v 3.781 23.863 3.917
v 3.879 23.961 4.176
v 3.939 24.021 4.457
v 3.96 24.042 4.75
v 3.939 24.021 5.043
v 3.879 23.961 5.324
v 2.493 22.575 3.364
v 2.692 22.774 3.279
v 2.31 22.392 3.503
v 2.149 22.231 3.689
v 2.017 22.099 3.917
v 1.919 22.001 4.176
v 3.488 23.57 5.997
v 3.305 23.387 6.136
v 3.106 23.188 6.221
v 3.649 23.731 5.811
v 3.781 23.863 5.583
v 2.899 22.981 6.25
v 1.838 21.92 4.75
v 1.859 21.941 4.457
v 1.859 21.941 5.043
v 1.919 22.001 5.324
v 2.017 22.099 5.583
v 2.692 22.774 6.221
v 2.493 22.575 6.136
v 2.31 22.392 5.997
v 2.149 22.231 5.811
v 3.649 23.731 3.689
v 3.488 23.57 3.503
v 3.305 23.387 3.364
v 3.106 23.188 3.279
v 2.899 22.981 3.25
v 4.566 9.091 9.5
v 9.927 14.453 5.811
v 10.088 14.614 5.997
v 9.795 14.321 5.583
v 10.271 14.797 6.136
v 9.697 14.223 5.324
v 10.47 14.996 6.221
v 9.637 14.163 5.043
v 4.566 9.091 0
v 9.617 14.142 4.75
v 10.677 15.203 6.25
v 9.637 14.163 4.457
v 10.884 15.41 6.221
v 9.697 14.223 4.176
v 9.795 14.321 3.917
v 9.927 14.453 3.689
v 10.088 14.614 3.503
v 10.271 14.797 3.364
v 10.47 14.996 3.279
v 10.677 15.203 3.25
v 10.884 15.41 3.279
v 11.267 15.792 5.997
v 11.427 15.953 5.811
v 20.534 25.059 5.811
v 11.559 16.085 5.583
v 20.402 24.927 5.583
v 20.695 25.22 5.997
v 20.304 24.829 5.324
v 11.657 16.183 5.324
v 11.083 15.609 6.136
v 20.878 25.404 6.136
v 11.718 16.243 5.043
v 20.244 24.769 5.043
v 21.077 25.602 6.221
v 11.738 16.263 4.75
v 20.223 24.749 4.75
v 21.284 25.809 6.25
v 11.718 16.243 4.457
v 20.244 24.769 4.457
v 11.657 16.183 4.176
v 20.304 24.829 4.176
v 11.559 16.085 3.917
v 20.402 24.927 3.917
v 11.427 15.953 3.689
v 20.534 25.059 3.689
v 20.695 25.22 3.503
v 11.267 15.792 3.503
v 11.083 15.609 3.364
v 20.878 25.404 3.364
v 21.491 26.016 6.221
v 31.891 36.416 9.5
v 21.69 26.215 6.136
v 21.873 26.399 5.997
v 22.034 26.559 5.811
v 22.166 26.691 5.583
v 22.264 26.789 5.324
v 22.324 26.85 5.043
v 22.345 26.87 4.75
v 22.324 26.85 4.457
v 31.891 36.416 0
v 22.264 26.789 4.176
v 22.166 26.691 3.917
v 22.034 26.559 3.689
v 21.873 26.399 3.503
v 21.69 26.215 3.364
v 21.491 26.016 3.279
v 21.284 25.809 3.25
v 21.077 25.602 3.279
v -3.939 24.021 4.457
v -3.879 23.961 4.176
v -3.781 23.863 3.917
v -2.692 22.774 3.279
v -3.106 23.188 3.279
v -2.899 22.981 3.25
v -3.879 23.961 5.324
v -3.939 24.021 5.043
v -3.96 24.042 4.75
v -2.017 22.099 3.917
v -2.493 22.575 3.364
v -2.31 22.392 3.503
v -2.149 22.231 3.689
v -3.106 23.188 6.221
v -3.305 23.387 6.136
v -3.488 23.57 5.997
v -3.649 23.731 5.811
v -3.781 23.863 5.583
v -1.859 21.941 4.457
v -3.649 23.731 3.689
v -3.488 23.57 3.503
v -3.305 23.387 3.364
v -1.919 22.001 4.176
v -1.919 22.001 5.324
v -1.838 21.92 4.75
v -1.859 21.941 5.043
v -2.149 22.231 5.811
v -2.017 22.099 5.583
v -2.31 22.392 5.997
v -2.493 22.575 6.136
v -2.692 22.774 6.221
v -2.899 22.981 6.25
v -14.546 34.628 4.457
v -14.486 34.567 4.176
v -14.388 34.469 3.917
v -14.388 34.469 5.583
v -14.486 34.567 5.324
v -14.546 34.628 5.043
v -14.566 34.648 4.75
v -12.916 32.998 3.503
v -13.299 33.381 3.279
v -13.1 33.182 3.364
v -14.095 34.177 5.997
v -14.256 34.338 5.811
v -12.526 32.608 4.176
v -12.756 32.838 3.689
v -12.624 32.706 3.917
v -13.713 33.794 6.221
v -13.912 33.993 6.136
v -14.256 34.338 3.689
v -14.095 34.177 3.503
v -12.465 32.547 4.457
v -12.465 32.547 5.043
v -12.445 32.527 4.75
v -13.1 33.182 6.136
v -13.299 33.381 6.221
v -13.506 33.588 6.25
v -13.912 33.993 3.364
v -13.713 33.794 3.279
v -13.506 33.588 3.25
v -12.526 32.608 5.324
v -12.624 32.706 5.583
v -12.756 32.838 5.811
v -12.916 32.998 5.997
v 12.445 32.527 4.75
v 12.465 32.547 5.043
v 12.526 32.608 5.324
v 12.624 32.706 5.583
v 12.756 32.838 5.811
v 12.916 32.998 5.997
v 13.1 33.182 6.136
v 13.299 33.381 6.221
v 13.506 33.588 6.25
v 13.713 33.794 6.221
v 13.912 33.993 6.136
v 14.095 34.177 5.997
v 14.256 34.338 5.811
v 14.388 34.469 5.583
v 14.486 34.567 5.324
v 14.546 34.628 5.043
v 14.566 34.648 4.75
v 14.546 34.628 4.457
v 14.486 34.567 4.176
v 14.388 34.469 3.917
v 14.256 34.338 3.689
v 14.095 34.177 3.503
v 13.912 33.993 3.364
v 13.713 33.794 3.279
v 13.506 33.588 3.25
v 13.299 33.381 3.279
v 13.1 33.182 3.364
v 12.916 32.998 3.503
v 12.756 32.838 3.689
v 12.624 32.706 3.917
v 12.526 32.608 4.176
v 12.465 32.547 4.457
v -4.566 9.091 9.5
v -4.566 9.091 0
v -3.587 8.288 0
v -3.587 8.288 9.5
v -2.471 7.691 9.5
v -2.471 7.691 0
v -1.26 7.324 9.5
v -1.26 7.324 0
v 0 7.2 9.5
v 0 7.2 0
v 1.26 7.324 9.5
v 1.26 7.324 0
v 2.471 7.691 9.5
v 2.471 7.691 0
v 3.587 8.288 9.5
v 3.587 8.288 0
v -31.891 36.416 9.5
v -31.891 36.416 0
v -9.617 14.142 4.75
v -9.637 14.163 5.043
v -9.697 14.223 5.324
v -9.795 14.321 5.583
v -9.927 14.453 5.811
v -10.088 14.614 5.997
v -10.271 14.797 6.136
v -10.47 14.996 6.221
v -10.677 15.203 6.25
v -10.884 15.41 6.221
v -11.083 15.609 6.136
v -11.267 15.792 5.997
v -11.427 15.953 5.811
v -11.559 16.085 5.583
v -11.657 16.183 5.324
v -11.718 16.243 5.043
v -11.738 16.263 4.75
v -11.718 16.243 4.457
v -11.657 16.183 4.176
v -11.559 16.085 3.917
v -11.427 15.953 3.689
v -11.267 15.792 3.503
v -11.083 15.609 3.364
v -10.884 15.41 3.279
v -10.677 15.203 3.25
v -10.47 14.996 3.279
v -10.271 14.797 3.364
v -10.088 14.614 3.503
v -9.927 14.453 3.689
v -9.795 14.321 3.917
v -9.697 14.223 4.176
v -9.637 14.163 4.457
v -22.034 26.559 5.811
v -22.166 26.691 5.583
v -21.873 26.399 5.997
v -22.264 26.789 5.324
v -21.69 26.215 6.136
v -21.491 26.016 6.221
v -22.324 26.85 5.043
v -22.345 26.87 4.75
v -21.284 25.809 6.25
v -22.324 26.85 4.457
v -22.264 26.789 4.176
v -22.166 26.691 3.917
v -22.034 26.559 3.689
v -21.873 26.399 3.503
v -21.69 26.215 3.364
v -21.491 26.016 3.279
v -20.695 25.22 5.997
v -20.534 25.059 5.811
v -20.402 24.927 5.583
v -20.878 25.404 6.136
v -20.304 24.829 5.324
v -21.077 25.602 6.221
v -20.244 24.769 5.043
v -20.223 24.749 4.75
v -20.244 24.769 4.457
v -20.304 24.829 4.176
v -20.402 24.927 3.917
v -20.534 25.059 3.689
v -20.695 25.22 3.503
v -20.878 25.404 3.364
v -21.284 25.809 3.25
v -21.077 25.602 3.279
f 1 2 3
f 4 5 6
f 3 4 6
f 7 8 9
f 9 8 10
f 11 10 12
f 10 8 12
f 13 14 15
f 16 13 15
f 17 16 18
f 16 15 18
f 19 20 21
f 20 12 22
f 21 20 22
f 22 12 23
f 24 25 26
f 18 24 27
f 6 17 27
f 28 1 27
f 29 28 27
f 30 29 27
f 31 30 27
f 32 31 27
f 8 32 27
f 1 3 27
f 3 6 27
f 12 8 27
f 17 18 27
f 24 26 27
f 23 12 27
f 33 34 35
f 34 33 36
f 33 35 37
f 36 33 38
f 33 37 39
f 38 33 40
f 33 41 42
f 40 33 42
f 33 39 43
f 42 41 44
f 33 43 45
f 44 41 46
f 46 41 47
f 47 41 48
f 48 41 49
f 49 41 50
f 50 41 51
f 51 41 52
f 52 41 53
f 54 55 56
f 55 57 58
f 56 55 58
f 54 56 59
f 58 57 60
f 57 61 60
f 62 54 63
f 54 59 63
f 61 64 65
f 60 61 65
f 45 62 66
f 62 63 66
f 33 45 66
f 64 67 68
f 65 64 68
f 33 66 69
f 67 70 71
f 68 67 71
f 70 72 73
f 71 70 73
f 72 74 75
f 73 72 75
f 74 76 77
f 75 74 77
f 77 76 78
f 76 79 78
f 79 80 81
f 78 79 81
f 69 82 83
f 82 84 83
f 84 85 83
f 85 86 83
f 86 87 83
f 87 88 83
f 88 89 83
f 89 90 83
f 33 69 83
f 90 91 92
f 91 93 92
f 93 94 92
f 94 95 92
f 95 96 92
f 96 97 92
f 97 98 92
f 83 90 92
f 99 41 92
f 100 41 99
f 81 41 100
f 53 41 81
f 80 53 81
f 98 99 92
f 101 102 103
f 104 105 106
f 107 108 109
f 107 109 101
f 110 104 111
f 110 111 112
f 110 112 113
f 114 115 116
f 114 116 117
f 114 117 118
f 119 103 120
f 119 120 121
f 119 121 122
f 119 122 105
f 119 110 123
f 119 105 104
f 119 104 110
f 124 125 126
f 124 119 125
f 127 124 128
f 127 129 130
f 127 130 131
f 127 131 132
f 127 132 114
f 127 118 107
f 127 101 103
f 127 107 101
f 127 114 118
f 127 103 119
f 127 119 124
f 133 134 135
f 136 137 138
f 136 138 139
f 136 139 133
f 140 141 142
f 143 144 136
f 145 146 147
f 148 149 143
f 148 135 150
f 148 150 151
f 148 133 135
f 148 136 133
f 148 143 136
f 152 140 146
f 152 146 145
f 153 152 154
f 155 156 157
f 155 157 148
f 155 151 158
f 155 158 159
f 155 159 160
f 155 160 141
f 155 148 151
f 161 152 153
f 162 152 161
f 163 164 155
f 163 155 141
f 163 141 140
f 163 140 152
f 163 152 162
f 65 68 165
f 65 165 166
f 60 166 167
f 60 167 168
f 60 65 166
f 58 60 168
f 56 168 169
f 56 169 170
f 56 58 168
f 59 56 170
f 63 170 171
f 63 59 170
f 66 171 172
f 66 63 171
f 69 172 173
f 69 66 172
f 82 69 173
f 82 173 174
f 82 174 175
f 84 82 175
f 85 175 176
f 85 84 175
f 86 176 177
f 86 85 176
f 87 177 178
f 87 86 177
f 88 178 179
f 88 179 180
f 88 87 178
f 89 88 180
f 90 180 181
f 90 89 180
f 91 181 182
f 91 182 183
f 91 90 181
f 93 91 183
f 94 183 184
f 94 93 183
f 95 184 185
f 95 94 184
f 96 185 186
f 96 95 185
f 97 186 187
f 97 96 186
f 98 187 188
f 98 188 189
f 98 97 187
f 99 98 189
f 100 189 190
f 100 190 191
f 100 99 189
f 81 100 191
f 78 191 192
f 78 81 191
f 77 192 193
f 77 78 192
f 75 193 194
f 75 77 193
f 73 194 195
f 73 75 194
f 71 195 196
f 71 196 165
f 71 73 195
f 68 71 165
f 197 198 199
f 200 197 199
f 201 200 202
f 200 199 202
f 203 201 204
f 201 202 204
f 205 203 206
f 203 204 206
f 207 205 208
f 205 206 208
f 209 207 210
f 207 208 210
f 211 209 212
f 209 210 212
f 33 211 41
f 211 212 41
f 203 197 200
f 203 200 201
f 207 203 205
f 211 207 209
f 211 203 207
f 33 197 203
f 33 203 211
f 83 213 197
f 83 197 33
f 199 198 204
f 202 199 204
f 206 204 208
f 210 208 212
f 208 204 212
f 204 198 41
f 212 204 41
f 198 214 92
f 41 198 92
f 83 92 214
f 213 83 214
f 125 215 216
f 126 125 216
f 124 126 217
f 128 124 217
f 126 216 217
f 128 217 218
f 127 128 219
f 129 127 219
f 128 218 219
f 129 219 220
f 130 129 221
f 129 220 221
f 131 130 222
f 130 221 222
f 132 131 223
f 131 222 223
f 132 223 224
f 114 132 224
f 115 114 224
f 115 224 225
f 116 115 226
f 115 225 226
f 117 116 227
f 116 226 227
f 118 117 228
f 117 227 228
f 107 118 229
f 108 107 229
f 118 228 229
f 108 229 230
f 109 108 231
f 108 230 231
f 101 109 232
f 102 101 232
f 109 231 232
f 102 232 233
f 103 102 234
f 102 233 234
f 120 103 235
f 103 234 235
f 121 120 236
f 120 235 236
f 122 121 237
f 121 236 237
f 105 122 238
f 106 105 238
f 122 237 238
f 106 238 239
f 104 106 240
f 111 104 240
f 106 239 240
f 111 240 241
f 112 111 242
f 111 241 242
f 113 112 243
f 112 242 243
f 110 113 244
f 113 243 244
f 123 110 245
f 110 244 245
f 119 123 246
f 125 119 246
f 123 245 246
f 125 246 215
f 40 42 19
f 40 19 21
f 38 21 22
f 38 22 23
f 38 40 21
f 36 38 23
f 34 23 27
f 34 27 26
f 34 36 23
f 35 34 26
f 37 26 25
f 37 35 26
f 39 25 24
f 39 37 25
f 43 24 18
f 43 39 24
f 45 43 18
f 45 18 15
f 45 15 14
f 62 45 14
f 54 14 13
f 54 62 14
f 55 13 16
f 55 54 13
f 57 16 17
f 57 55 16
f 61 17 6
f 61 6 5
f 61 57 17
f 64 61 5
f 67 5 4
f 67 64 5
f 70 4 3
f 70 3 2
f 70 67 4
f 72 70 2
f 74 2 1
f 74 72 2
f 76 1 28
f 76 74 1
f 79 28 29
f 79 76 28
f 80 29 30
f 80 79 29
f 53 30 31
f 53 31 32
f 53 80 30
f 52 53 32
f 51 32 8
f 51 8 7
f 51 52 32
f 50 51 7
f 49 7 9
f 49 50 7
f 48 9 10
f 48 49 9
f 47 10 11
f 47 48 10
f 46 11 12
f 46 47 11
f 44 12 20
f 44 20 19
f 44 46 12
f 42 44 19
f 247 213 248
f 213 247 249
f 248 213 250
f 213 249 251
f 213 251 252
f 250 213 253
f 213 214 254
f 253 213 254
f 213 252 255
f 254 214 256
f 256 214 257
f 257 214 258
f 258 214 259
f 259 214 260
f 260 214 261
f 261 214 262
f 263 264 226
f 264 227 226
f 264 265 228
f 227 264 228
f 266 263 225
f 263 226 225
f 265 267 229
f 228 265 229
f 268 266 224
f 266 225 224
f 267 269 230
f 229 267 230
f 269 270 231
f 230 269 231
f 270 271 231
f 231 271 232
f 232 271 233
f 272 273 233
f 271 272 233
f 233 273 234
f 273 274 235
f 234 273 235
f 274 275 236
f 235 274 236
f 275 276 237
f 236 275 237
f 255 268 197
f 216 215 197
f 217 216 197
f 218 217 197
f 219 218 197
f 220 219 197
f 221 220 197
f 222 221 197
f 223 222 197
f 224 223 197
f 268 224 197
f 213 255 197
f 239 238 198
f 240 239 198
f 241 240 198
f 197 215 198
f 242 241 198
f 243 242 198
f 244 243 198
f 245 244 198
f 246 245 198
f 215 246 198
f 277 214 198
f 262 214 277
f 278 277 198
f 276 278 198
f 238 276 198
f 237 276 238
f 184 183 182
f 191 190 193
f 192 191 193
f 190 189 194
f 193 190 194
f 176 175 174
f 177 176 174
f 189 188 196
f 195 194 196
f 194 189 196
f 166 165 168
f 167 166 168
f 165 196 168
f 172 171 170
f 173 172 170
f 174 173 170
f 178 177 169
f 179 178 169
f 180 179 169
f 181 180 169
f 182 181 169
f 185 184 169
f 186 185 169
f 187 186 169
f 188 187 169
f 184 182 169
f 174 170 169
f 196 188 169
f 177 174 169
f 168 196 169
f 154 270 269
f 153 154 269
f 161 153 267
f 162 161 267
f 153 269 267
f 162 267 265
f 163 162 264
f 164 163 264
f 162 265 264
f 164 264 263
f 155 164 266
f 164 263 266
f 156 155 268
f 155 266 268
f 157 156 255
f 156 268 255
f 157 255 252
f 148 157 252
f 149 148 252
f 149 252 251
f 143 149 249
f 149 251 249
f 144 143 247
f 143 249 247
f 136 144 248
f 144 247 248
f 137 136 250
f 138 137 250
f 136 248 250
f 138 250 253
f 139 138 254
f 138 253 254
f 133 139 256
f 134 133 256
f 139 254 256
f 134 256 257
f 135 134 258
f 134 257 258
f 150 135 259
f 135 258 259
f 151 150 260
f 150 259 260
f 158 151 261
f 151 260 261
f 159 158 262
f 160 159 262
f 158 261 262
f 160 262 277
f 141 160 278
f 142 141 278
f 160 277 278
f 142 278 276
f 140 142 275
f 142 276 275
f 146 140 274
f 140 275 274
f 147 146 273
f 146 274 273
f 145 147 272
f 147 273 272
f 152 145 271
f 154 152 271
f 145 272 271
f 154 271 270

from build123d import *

# Parameters (mm, degrees)
BOSS_EXTRUDE1_DEPTH = 9.5
SKETCH5_R           = 1.5
CUT_EXTRUDE3_DEPTH  = 11


with BuildPart() as part:
    # Sketch1 → Boss-Extrude1 (new body)
    with BuildSketch(Plane.XY):
        with BuildLine():
            Line((4.565685425, 9.091168825), (31.890515832, 36.415999231))
            Line((31.890515832, 36.415999231), (-31.890515832, 36.415999231))
            Line((-31.890515832, 36.415999231), (-4.565685425, 9.091168825))
            ThreePointArc((-4.565685425, 9.091168825), (0, 7.2), (4.565685425, 9.091168825))
        make_face()
    extrude(amount=BOSS_EXTRUDE1_DEPTH)

    # Sketch5 → Cut-Extrude3 (cut)
    with BuildSketch(Plane(origin=(2.2627417, 2.2627417, 0), x_dir=(0, 0, 1), z_dir=(-0.7071067811865512, -0.7071067811865438, 0))):
        with Locations(Location((4.75, 33.3, 0), (0, 0, 270))):
            Circle(SKETCH5_R)
        with Locations(Location((4.75, 18.3, 0), (0, 0, 270))):
            Circle(SKETCH5_R)
    cut_extrude3 = extrude(amount=-CUT_EXTRUDE3_DEPTH, mode=Mode.SUBTRACT)

    # Mirror1: Cut-Extrude3 across plane
    add(cut_extrude3.mirror(Plane(origin=(0, 0, 0), x_dir=(0, 0, 1), z_dir=(1, 0, 0))), mode=Mode.SUBTRACT)


solid = part.part
